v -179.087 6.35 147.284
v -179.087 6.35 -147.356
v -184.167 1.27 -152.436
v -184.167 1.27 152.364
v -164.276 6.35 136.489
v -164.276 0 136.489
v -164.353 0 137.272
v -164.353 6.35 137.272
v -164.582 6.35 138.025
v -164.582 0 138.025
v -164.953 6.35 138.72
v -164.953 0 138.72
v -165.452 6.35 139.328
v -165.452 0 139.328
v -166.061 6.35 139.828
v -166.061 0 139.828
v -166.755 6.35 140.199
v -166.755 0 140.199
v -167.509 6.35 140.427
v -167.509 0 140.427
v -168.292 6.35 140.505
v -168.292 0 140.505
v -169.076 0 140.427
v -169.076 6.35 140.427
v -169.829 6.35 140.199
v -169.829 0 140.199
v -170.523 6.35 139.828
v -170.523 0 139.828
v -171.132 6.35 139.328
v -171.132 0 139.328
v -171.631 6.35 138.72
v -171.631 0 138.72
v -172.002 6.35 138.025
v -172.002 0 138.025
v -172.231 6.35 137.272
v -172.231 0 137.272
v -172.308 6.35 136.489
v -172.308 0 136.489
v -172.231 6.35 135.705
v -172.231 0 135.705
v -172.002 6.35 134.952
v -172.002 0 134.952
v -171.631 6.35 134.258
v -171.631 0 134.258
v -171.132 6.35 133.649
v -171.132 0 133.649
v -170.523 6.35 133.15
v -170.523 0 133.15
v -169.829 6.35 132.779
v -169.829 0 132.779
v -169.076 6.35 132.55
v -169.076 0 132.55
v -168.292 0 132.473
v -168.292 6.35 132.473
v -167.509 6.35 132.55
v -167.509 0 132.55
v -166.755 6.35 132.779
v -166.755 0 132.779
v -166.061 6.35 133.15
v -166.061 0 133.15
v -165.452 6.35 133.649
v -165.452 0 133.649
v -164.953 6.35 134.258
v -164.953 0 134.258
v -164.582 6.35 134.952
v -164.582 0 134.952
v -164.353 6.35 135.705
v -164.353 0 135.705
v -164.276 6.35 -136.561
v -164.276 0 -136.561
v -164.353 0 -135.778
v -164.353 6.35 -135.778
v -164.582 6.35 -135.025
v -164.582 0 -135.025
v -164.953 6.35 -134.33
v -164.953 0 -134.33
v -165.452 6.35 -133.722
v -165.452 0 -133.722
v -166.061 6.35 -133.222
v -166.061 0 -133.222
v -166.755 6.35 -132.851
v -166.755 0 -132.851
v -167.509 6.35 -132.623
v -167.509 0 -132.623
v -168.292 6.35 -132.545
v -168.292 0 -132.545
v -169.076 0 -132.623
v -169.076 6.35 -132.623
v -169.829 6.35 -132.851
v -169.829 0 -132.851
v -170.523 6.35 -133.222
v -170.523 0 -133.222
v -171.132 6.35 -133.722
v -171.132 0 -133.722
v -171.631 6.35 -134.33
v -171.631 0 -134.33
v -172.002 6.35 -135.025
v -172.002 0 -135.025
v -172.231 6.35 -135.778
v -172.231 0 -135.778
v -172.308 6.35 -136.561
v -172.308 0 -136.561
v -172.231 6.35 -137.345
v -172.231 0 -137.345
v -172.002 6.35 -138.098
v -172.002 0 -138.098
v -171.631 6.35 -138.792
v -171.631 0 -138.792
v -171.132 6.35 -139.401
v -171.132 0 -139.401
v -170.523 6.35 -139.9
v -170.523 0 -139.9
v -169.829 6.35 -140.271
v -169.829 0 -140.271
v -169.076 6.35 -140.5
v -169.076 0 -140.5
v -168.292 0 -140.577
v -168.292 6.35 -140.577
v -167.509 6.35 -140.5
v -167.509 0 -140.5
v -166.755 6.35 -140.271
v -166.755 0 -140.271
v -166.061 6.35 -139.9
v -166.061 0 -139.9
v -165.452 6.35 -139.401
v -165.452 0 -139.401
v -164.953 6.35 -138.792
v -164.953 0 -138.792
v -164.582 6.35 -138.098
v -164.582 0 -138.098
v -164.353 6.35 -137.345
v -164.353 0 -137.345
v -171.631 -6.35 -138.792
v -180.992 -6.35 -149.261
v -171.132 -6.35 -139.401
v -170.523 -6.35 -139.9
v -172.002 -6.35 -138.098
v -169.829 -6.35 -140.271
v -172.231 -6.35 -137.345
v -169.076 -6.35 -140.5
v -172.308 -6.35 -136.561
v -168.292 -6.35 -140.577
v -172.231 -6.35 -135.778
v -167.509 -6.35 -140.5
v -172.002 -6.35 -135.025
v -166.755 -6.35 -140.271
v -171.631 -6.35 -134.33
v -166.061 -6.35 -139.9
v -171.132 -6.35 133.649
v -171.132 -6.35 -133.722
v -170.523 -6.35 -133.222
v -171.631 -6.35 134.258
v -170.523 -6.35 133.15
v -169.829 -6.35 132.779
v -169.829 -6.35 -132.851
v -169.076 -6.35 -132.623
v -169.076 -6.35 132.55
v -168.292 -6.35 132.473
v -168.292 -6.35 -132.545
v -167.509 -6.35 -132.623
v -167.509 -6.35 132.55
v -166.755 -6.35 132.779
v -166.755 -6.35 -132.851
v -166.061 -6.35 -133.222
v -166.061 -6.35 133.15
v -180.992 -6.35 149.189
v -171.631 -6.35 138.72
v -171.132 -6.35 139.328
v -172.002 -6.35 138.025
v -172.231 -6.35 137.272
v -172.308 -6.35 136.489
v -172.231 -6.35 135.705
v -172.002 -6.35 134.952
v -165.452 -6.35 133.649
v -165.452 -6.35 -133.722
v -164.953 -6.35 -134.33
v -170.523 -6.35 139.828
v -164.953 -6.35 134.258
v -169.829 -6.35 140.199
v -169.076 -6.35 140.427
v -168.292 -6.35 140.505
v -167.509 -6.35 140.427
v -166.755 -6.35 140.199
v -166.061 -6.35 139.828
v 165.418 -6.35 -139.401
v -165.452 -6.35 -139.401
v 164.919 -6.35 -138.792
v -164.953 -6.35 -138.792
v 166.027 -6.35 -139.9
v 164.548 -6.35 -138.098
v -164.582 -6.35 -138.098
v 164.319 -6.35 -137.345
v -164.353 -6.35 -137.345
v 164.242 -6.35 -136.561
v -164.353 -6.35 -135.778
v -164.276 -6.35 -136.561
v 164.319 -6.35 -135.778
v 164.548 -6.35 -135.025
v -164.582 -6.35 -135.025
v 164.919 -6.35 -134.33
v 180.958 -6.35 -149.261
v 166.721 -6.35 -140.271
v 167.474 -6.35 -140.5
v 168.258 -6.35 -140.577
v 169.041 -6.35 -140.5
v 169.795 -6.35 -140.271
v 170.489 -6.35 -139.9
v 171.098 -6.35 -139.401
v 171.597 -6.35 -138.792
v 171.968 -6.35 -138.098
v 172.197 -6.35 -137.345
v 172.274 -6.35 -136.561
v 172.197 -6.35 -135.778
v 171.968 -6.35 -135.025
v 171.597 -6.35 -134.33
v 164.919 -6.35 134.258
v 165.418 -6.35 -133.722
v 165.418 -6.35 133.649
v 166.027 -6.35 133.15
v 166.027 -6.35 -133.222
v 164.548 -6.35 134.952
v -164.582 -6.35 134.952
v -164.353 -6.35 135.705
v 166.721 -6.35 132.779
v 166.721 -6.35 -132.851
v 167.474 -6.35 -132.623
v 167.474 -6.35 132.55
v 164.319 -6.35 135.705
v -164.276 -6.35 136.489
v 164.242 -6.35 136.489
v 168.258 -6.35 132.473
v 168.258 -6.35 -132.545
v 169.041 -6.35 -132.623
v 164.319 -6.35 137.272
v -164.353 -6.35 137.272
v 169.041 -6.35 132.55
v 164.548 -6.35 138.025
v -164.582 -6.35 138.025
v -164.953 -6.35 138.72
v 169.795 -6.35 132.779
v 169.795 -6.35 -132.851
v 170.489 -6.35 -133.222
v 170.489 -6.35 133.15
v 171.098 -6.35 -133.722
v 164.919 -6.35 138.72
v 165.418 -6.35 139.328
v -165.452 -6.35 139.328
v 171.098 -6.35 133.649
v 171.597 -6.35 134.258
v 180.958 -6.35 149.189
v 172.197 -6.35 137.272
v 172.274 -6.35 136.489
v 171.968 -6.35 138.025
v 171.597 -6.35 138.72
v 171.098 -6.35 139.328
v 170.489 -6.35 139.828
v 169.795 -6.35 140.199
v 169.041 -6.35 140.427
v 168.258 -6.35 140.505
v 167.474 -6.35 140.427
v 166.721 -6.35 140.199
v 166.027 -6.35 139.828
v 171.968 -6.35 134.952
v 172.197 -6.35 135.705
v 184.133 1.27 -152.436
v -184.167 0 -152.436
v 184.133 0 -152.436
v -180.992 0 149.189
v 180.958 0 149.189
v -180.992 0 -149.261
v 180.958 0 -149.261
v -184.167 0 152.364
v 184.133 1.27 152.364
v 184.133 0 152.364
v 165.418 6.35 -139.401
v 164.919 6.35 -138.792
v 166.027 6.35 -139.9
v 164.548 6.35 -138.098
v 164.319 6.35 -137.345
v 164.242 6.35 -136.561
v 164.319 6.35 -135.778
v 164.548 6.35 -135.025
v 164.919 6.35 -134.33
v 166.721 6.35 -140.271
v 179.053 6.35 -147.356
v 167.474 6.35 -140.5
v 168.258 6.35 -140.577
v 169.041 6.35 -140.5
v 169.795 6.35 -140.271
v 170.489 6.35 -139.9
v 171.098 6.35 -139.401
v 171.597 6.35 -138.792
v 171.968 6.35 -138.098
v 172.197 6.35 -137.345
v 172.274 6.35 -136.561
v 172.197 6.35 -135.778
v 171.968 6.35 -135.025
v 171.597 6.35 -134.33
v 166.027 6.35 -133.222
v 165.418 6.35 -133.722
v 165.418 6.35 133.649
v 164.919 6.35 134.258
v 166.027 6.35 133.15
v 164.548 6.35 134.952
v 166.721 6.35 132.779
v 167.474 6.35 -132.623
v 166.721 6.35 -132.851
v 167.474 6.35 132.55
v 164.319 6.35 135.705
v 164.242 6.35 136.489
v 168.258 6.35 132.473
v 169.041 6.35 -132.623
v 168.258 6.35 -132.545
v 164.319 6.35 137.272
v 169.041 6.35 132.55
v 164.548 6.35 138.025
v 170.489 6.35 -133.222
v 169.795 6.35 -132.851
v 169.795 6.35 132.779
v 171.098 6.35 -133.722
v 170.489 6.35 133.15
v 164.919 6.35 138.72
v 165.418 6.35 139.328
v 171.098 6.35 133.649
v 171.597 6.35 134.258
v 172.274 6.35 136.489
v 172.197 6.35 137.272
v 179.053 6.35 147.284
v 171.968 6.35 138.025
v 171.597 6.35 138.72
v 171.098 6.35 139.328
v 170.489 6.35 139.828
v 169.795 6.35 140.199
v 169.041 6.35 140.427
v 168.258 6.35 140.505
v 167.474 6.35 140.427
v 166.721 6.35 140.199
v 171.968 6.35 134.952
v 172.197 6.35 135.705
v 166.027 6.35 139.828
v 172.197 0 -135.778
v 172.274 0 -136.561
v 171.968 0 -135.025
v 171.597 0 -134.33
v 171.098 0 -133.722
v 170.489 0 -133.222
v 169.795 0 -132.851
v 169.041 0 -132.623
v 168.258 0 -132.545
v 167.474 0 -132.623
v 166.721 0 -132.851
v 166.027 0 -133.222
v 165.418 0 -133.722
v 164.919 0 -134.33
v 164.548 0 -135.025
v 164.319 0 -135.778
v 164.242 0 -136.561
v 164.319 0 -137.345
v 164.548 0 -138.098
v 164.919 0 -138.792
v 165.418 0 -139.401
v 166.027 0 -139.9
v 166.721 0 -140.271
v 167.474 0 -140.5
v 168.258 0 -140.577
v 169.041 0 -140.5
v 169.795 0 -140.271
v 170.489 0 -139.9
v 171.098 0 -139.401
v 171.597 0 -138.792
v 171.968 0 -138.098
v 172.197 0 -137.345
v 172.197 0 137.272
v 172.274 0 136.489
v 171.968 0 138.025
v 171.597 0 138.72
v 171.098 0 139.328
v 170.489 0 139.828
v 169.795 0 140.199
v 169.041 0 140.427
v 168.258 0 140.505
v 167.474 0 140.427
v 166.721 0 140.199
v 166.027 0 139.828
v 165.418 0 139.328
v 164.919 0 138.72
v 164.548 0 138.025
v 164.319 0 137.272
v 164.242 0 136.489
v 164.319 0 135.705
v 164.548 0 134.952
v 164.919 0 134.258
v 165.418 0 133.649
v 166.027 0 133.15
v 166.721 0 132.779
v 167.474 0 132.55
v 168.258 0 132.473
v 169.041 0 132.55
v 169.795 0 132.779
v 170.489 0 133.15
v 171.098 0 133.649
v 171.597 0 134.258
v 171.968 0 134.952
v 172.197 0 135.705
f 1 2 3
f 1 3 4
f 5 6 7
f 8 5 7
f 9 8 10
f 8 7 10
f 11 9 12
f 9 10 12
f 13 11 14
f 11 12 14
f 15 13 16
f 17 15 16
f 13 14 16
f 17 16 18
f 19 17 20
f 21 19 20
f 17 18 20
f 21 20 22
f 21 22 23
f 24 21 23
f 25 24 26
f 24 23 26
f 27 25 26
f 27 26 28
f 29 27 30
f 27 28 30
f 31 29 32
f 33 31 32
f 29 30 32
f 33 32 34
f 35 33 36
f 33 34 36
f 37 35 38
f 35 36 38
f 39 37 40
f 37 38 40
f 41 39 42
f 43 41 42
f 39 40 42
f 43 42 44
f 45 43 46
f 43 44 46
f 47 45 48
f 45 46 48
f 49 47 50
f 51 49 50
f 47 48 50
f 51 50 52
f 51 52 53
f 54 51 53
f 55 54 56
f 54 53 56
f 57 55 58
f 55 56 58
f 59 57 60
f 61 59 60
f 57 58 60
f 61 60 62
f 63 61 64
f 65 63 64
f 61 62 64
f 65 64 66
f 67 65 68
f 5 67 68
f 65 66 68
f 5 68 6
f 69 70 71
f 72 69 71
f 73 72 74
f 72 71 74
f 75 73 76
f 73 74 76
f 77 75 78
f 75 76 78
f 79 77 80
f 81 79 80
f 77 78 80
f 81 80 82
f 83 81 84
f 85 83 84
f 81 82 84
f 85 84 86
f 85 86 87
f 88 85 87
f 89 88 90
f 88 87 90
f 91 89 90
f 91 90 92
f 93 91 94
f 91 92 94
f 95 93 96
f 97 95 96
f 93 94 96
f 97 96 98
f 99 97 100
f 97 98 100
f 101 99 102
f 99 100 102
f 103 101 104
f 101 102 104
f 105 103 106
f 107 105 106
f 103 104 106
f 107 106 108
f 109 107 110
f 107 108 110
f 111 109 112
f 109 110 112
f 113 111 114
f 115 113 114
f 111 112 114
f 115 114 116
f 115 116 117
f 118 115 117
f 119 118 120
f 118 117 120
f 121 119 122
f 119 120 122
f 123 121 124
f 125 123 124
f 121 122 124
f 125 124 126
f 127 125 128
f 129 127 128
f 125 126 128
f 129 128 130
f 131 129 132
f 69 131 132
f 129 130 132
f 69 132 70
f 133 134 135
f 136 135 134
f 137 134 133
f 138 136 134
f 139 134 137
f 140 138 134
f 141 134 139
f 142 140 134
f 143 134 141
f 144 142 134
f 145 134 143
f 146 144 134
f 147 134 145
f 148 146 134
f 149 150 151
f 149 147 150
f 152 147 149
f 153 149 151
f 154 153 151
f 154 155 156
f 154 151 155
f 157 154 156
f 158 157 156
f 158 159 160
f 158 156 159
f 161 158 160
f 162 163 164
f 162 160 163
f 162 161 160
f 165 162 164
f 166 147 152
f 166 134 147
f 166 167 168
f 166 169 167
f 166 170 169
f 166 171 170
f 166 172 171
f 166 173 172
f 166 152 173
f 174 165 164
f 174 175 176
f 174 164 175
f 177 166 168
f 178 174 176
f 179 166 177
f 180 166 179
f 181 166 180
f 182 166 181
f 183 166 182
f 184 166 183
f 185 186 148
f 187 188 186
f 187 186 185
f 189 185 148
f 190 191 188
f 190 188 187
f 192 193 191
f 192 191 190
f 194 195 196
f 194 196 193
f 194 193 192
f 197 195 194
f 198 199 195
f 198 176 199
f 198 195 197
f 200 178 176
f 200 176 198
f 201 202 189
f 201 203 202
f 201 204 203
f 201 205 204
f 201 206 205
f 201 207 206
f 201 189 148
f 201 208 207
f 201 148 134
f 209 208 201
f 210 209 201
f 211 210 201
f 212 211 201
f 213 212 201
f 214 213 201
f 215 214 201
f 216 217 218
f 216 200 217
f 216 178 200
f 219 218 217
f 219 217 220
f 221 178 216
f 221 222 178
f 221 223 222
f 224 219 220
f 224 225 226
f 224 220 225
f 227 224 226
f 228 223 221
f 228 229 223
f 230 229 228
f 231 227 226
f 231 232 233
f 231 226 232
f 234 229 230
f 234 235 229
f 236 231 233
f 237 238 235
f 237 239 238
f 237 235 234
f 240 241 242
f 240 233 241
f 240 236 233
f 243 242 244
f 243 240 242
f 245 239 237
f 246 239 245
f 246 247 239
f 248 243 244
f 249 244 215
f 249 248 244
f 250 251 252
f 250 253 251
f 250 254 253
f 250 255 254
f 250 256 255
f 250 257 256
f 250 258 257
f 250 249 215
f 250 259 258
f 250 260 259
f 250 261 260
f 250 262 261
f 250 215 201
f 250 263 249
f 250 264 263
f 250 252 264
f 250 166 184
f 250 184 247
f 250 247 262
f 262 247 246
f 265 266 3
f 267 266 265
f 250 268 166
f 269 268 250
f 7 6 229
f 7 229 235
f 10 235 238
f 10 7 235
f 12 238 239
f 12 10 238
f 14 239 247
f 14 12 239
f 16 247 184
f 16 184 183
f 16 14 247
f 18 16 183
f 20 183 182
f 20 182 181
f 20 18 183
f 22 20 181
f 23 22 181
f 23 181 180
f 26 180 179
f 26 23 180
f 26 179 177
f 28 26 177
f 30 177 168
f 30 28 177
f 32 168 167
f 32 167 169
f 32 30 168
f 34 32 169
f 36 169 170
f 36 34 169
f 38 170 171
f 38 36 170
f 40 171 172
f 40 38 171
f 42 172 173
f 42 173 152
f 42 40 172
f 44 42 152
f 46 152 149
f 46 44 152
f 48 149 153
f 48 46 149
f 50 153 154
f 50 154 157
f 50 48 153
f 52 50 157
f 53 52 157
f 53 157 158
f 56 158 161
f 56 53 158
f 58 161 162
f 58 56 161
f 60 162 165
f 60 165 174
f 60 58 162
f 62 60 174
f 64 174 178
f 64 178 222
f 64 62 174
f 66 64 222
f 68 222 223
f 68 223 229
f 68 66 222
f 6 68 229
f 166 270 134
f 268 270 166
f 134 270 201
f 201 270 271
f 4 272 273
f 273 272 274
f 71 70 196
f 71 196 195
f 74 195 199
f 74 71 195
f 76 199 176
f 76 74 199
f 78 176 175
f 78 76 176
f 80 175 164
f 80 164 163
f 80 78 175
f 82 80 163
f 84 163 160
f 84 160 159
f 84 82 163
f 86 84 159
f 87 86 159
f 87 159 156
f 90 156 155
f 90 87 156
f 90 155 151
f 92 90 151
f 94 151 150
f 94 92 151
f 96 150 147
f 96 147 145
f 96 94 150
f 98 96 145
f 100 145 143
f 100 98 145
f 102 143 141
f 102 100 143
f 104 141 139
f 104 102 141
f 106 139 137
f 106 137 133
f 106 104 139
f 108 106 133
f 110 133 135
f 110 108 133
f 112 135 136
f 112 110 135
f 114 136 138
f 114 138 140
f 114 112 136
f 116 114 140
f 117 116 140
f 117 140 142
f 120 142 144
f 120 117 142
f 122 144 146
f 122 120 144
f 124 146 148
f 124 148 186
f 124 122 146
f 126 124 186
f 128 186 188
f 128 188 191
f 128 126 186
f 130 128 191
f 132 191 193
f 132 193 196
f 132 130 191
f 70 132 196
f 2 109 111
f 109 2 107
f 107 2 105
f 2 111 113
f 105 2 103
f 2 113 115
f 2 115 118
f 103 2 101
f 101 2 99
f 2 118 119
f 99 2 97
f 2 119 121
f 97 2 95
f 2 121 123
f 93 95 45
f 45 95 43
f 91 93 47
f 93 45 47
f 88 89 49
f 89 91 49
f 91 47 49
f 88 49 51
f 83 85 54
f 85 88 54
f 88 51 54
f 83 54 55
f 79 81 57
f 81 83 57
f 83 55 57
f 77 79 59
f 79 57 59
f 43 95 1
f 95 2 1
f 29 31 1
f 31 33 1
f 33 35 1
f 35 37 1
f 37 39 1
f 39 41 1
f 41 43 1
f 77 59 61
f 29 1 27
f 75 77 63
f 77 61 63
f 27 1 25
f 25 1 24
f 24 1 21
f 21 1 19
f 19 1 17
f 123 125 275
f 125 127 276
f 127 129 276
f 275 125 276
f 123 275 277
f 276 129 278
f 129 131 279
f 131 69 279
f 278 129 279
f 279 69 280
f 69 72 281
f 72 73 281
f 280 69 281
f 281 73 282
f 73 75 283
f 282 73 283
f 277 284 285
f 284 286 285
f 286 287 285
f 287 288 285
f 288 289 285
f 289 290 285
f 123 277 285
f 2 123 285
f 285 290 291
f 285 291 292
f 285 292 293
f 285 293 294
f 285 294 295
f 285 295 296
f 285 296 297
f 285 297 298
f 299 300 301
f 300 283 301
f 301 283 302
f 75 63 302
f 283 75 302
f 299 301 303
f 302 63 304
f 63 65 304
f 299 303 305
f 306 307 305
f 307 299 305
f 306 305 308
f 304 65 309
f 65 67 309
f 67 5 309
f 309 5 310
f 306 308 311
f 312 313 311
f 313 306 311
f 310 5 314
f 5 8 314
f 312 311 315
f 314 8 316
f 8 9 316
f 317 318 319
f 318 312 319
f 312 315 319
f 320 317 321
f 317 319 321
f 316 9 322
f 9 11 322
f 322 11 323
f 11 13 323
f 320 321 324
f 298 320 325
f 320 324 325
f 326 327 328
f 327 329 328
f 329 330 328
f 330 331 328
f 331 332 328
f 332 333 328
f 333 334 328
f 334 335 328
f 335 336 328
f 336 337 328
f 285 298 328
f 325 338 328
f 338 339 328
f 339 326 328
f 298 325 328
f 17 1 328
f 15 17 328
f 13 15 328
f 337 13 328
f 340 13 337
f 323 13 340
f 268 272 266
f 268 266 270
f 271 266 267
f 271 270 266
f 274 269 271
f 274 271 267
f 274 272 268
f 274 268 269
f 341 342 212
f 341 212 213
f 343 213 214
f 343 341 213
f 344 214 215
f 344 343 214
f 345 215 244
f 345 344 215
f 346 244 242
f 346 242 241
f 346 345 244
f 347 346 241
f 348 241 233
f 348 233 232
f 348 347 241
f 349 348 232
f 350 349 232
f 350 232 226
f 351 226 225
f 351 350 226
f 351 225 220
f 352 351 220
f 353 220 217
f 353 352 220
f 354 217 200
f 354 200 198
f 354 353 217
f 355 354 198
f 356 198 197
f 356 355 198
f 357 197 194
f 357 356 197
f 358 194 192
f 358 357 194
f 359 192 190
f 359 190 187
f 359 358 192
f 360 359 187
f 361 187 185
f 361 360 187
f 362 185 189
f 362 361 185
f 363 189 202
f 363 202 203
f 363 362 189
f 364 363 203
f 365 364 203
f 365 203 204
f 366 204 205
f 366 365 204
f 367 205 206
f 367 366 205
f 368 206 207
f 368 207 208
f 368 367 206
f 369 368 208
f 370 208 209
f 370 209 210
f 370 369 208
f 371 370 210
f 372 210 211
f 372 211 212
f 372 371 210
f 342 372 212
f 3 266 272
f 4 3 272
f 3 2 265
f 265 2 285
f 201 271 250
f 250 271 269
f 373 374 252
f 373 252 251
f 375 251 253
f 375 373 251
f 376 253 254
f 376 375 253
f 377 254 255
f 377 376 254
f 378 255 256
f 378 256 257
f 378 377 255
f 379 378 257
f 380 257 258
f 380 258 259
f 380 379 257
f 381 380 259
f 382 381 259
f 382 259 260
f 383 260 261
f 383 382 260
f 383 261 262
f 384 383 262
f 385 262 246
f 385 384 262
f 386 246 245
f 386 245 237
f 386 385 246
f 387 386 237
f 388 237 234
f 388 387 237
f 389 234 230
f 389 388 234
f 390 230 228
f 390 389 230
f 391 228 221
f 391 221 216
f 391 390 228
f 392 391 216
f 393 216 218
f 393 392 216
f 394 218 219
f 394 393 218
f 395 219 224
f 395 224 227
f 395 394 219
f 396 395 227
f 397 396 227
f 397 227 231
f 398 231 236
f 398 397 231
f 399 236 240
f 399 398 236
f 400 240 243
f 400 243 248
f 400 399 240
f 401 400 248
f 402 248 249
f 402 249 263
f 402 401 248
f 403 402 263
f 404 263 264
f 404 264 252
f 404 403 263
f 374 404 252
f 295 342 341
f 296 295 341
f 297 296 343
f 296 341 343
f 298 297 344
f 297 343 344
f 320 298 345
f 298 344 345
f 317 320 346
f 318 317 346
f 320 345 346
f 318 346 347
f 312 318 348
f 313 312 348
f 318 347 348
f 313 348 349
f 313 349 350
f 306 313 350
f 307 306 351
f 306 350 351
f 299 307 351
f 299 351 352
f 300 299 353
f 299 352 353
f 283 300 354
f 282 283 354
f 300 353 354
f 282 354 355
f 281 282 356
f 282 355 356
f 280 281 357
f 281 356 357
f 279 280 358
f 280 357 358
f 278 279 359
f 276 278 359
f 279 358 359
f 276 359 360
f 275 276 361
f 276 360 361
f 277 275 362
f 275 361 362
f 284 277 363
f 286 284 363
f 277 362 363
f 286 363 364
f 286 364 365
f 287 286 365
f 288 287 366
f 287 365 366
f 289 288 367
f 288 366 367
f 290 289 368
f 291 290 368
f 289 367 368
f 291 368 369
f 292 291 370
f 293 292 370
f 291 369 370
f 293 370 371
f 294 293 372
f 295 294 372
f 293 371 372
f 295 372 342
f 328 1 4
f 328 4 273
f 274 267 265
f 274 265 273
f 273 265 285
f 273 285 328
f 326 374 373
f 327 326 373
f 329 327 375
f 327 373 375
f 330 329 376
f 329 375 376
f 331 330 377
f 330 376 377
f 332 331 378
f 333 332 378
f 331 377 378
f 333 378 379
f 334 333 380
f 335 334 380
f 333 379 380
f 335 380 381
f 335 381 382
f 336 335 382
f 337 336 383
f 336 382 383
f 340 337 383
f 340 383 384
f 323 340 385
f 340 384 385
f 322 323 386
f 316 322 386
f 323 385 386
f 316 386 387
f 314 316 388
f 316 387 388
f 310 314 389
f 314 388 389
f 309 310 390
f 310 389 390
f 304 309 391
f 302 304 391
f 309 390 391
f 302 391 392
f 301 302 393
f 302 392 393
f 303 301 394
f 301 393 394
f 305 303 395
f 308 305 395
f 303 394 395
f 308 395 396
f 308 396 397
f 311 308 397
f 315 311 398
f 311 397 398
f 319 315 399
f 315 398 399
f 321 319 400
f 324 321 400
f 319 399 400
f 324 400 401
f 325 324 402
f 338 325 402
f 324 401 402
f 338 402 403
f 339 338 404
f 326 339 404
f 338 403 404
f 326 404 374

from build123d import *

# Parameters (mm, degrees)
F0_W     = 361.95
F0_H     = 298.45
F0_R     = 4.015807
F1_DEPTH = 6.35
F0_W_2   = 368.3
F0_H_2   = 304.8
F2_DEPTH = 6.35
F3_SIZE  = 5.08


with BuildPart() as f1:
    # F0 (on Front) → F1 (new body)
    with BuildSketch(Plane.XZ):
        with Locations((-0.017055, -0.036295)):
            Rectangle(F0_W, F0_H)
        with Locations((-168.292055, -136.561295)):
            Circle(F0_R, mode=Mode.SUBTRACT)
        with Locations((168.257945, -136.561295)):
            Circle(F0_R, mode=Mode.SUBTRACT)
        with Locations((-168.292055, 136.488705)):
            Circle(F0_R, mode=Mode.SUBTRACT)
        with Locations((168.257945, 136.488705)):
            Circle(F0_R, mode=Mode.SUBTRACT)
    extrude(amount=F1_DEPTH)

    # F0 (on Front) → F2 (join)
    with BuildSketch(Plane.XZ):
        with Locations((-0.017055, -0.036295)):
            Rectangle(F0_W_2, F0_H_2)
        with Locations((-0.017055, -0.036295)):
            Rectangle(F0_W, F0_H, mode=Mode.SUBTRACT)
        with Locations((-0.017055, -0.036295)):
            Rectangle(F0_W, F0_H)
        with Locations((-168.292055, -136.561295)):
            Circle(F0_R, mode=Mode.SUBTRACT)
        with Locations((168.257945, -136.561295)):
            Circle(F0_R, mode=Mode.SUBTRACT)
        with Locations((-168.292055, 136.488705)):
            Circle(F0_R, mode=Mode.SUBTRACT)
        with Locations((168.257945, 136.488705)):
            Circle(F0_R, mode=Mode.SUBTRACT)
    extrude(amount=-F2_DEPTH)

    # F3
    f3_edges = [f1.edges().sort_by_distance(p)[0] for p in [
        (-0.017055, 6.35, 152.363705),
        (184.132945, 6.35, -0.036295),
        (-0.017055, 6.35, -152.436295),
        (-184.167055, 6.35, -0.036295),
    ]]
    chamfer(f3_edges, length=F3_SIZE)


solid = f1.part
